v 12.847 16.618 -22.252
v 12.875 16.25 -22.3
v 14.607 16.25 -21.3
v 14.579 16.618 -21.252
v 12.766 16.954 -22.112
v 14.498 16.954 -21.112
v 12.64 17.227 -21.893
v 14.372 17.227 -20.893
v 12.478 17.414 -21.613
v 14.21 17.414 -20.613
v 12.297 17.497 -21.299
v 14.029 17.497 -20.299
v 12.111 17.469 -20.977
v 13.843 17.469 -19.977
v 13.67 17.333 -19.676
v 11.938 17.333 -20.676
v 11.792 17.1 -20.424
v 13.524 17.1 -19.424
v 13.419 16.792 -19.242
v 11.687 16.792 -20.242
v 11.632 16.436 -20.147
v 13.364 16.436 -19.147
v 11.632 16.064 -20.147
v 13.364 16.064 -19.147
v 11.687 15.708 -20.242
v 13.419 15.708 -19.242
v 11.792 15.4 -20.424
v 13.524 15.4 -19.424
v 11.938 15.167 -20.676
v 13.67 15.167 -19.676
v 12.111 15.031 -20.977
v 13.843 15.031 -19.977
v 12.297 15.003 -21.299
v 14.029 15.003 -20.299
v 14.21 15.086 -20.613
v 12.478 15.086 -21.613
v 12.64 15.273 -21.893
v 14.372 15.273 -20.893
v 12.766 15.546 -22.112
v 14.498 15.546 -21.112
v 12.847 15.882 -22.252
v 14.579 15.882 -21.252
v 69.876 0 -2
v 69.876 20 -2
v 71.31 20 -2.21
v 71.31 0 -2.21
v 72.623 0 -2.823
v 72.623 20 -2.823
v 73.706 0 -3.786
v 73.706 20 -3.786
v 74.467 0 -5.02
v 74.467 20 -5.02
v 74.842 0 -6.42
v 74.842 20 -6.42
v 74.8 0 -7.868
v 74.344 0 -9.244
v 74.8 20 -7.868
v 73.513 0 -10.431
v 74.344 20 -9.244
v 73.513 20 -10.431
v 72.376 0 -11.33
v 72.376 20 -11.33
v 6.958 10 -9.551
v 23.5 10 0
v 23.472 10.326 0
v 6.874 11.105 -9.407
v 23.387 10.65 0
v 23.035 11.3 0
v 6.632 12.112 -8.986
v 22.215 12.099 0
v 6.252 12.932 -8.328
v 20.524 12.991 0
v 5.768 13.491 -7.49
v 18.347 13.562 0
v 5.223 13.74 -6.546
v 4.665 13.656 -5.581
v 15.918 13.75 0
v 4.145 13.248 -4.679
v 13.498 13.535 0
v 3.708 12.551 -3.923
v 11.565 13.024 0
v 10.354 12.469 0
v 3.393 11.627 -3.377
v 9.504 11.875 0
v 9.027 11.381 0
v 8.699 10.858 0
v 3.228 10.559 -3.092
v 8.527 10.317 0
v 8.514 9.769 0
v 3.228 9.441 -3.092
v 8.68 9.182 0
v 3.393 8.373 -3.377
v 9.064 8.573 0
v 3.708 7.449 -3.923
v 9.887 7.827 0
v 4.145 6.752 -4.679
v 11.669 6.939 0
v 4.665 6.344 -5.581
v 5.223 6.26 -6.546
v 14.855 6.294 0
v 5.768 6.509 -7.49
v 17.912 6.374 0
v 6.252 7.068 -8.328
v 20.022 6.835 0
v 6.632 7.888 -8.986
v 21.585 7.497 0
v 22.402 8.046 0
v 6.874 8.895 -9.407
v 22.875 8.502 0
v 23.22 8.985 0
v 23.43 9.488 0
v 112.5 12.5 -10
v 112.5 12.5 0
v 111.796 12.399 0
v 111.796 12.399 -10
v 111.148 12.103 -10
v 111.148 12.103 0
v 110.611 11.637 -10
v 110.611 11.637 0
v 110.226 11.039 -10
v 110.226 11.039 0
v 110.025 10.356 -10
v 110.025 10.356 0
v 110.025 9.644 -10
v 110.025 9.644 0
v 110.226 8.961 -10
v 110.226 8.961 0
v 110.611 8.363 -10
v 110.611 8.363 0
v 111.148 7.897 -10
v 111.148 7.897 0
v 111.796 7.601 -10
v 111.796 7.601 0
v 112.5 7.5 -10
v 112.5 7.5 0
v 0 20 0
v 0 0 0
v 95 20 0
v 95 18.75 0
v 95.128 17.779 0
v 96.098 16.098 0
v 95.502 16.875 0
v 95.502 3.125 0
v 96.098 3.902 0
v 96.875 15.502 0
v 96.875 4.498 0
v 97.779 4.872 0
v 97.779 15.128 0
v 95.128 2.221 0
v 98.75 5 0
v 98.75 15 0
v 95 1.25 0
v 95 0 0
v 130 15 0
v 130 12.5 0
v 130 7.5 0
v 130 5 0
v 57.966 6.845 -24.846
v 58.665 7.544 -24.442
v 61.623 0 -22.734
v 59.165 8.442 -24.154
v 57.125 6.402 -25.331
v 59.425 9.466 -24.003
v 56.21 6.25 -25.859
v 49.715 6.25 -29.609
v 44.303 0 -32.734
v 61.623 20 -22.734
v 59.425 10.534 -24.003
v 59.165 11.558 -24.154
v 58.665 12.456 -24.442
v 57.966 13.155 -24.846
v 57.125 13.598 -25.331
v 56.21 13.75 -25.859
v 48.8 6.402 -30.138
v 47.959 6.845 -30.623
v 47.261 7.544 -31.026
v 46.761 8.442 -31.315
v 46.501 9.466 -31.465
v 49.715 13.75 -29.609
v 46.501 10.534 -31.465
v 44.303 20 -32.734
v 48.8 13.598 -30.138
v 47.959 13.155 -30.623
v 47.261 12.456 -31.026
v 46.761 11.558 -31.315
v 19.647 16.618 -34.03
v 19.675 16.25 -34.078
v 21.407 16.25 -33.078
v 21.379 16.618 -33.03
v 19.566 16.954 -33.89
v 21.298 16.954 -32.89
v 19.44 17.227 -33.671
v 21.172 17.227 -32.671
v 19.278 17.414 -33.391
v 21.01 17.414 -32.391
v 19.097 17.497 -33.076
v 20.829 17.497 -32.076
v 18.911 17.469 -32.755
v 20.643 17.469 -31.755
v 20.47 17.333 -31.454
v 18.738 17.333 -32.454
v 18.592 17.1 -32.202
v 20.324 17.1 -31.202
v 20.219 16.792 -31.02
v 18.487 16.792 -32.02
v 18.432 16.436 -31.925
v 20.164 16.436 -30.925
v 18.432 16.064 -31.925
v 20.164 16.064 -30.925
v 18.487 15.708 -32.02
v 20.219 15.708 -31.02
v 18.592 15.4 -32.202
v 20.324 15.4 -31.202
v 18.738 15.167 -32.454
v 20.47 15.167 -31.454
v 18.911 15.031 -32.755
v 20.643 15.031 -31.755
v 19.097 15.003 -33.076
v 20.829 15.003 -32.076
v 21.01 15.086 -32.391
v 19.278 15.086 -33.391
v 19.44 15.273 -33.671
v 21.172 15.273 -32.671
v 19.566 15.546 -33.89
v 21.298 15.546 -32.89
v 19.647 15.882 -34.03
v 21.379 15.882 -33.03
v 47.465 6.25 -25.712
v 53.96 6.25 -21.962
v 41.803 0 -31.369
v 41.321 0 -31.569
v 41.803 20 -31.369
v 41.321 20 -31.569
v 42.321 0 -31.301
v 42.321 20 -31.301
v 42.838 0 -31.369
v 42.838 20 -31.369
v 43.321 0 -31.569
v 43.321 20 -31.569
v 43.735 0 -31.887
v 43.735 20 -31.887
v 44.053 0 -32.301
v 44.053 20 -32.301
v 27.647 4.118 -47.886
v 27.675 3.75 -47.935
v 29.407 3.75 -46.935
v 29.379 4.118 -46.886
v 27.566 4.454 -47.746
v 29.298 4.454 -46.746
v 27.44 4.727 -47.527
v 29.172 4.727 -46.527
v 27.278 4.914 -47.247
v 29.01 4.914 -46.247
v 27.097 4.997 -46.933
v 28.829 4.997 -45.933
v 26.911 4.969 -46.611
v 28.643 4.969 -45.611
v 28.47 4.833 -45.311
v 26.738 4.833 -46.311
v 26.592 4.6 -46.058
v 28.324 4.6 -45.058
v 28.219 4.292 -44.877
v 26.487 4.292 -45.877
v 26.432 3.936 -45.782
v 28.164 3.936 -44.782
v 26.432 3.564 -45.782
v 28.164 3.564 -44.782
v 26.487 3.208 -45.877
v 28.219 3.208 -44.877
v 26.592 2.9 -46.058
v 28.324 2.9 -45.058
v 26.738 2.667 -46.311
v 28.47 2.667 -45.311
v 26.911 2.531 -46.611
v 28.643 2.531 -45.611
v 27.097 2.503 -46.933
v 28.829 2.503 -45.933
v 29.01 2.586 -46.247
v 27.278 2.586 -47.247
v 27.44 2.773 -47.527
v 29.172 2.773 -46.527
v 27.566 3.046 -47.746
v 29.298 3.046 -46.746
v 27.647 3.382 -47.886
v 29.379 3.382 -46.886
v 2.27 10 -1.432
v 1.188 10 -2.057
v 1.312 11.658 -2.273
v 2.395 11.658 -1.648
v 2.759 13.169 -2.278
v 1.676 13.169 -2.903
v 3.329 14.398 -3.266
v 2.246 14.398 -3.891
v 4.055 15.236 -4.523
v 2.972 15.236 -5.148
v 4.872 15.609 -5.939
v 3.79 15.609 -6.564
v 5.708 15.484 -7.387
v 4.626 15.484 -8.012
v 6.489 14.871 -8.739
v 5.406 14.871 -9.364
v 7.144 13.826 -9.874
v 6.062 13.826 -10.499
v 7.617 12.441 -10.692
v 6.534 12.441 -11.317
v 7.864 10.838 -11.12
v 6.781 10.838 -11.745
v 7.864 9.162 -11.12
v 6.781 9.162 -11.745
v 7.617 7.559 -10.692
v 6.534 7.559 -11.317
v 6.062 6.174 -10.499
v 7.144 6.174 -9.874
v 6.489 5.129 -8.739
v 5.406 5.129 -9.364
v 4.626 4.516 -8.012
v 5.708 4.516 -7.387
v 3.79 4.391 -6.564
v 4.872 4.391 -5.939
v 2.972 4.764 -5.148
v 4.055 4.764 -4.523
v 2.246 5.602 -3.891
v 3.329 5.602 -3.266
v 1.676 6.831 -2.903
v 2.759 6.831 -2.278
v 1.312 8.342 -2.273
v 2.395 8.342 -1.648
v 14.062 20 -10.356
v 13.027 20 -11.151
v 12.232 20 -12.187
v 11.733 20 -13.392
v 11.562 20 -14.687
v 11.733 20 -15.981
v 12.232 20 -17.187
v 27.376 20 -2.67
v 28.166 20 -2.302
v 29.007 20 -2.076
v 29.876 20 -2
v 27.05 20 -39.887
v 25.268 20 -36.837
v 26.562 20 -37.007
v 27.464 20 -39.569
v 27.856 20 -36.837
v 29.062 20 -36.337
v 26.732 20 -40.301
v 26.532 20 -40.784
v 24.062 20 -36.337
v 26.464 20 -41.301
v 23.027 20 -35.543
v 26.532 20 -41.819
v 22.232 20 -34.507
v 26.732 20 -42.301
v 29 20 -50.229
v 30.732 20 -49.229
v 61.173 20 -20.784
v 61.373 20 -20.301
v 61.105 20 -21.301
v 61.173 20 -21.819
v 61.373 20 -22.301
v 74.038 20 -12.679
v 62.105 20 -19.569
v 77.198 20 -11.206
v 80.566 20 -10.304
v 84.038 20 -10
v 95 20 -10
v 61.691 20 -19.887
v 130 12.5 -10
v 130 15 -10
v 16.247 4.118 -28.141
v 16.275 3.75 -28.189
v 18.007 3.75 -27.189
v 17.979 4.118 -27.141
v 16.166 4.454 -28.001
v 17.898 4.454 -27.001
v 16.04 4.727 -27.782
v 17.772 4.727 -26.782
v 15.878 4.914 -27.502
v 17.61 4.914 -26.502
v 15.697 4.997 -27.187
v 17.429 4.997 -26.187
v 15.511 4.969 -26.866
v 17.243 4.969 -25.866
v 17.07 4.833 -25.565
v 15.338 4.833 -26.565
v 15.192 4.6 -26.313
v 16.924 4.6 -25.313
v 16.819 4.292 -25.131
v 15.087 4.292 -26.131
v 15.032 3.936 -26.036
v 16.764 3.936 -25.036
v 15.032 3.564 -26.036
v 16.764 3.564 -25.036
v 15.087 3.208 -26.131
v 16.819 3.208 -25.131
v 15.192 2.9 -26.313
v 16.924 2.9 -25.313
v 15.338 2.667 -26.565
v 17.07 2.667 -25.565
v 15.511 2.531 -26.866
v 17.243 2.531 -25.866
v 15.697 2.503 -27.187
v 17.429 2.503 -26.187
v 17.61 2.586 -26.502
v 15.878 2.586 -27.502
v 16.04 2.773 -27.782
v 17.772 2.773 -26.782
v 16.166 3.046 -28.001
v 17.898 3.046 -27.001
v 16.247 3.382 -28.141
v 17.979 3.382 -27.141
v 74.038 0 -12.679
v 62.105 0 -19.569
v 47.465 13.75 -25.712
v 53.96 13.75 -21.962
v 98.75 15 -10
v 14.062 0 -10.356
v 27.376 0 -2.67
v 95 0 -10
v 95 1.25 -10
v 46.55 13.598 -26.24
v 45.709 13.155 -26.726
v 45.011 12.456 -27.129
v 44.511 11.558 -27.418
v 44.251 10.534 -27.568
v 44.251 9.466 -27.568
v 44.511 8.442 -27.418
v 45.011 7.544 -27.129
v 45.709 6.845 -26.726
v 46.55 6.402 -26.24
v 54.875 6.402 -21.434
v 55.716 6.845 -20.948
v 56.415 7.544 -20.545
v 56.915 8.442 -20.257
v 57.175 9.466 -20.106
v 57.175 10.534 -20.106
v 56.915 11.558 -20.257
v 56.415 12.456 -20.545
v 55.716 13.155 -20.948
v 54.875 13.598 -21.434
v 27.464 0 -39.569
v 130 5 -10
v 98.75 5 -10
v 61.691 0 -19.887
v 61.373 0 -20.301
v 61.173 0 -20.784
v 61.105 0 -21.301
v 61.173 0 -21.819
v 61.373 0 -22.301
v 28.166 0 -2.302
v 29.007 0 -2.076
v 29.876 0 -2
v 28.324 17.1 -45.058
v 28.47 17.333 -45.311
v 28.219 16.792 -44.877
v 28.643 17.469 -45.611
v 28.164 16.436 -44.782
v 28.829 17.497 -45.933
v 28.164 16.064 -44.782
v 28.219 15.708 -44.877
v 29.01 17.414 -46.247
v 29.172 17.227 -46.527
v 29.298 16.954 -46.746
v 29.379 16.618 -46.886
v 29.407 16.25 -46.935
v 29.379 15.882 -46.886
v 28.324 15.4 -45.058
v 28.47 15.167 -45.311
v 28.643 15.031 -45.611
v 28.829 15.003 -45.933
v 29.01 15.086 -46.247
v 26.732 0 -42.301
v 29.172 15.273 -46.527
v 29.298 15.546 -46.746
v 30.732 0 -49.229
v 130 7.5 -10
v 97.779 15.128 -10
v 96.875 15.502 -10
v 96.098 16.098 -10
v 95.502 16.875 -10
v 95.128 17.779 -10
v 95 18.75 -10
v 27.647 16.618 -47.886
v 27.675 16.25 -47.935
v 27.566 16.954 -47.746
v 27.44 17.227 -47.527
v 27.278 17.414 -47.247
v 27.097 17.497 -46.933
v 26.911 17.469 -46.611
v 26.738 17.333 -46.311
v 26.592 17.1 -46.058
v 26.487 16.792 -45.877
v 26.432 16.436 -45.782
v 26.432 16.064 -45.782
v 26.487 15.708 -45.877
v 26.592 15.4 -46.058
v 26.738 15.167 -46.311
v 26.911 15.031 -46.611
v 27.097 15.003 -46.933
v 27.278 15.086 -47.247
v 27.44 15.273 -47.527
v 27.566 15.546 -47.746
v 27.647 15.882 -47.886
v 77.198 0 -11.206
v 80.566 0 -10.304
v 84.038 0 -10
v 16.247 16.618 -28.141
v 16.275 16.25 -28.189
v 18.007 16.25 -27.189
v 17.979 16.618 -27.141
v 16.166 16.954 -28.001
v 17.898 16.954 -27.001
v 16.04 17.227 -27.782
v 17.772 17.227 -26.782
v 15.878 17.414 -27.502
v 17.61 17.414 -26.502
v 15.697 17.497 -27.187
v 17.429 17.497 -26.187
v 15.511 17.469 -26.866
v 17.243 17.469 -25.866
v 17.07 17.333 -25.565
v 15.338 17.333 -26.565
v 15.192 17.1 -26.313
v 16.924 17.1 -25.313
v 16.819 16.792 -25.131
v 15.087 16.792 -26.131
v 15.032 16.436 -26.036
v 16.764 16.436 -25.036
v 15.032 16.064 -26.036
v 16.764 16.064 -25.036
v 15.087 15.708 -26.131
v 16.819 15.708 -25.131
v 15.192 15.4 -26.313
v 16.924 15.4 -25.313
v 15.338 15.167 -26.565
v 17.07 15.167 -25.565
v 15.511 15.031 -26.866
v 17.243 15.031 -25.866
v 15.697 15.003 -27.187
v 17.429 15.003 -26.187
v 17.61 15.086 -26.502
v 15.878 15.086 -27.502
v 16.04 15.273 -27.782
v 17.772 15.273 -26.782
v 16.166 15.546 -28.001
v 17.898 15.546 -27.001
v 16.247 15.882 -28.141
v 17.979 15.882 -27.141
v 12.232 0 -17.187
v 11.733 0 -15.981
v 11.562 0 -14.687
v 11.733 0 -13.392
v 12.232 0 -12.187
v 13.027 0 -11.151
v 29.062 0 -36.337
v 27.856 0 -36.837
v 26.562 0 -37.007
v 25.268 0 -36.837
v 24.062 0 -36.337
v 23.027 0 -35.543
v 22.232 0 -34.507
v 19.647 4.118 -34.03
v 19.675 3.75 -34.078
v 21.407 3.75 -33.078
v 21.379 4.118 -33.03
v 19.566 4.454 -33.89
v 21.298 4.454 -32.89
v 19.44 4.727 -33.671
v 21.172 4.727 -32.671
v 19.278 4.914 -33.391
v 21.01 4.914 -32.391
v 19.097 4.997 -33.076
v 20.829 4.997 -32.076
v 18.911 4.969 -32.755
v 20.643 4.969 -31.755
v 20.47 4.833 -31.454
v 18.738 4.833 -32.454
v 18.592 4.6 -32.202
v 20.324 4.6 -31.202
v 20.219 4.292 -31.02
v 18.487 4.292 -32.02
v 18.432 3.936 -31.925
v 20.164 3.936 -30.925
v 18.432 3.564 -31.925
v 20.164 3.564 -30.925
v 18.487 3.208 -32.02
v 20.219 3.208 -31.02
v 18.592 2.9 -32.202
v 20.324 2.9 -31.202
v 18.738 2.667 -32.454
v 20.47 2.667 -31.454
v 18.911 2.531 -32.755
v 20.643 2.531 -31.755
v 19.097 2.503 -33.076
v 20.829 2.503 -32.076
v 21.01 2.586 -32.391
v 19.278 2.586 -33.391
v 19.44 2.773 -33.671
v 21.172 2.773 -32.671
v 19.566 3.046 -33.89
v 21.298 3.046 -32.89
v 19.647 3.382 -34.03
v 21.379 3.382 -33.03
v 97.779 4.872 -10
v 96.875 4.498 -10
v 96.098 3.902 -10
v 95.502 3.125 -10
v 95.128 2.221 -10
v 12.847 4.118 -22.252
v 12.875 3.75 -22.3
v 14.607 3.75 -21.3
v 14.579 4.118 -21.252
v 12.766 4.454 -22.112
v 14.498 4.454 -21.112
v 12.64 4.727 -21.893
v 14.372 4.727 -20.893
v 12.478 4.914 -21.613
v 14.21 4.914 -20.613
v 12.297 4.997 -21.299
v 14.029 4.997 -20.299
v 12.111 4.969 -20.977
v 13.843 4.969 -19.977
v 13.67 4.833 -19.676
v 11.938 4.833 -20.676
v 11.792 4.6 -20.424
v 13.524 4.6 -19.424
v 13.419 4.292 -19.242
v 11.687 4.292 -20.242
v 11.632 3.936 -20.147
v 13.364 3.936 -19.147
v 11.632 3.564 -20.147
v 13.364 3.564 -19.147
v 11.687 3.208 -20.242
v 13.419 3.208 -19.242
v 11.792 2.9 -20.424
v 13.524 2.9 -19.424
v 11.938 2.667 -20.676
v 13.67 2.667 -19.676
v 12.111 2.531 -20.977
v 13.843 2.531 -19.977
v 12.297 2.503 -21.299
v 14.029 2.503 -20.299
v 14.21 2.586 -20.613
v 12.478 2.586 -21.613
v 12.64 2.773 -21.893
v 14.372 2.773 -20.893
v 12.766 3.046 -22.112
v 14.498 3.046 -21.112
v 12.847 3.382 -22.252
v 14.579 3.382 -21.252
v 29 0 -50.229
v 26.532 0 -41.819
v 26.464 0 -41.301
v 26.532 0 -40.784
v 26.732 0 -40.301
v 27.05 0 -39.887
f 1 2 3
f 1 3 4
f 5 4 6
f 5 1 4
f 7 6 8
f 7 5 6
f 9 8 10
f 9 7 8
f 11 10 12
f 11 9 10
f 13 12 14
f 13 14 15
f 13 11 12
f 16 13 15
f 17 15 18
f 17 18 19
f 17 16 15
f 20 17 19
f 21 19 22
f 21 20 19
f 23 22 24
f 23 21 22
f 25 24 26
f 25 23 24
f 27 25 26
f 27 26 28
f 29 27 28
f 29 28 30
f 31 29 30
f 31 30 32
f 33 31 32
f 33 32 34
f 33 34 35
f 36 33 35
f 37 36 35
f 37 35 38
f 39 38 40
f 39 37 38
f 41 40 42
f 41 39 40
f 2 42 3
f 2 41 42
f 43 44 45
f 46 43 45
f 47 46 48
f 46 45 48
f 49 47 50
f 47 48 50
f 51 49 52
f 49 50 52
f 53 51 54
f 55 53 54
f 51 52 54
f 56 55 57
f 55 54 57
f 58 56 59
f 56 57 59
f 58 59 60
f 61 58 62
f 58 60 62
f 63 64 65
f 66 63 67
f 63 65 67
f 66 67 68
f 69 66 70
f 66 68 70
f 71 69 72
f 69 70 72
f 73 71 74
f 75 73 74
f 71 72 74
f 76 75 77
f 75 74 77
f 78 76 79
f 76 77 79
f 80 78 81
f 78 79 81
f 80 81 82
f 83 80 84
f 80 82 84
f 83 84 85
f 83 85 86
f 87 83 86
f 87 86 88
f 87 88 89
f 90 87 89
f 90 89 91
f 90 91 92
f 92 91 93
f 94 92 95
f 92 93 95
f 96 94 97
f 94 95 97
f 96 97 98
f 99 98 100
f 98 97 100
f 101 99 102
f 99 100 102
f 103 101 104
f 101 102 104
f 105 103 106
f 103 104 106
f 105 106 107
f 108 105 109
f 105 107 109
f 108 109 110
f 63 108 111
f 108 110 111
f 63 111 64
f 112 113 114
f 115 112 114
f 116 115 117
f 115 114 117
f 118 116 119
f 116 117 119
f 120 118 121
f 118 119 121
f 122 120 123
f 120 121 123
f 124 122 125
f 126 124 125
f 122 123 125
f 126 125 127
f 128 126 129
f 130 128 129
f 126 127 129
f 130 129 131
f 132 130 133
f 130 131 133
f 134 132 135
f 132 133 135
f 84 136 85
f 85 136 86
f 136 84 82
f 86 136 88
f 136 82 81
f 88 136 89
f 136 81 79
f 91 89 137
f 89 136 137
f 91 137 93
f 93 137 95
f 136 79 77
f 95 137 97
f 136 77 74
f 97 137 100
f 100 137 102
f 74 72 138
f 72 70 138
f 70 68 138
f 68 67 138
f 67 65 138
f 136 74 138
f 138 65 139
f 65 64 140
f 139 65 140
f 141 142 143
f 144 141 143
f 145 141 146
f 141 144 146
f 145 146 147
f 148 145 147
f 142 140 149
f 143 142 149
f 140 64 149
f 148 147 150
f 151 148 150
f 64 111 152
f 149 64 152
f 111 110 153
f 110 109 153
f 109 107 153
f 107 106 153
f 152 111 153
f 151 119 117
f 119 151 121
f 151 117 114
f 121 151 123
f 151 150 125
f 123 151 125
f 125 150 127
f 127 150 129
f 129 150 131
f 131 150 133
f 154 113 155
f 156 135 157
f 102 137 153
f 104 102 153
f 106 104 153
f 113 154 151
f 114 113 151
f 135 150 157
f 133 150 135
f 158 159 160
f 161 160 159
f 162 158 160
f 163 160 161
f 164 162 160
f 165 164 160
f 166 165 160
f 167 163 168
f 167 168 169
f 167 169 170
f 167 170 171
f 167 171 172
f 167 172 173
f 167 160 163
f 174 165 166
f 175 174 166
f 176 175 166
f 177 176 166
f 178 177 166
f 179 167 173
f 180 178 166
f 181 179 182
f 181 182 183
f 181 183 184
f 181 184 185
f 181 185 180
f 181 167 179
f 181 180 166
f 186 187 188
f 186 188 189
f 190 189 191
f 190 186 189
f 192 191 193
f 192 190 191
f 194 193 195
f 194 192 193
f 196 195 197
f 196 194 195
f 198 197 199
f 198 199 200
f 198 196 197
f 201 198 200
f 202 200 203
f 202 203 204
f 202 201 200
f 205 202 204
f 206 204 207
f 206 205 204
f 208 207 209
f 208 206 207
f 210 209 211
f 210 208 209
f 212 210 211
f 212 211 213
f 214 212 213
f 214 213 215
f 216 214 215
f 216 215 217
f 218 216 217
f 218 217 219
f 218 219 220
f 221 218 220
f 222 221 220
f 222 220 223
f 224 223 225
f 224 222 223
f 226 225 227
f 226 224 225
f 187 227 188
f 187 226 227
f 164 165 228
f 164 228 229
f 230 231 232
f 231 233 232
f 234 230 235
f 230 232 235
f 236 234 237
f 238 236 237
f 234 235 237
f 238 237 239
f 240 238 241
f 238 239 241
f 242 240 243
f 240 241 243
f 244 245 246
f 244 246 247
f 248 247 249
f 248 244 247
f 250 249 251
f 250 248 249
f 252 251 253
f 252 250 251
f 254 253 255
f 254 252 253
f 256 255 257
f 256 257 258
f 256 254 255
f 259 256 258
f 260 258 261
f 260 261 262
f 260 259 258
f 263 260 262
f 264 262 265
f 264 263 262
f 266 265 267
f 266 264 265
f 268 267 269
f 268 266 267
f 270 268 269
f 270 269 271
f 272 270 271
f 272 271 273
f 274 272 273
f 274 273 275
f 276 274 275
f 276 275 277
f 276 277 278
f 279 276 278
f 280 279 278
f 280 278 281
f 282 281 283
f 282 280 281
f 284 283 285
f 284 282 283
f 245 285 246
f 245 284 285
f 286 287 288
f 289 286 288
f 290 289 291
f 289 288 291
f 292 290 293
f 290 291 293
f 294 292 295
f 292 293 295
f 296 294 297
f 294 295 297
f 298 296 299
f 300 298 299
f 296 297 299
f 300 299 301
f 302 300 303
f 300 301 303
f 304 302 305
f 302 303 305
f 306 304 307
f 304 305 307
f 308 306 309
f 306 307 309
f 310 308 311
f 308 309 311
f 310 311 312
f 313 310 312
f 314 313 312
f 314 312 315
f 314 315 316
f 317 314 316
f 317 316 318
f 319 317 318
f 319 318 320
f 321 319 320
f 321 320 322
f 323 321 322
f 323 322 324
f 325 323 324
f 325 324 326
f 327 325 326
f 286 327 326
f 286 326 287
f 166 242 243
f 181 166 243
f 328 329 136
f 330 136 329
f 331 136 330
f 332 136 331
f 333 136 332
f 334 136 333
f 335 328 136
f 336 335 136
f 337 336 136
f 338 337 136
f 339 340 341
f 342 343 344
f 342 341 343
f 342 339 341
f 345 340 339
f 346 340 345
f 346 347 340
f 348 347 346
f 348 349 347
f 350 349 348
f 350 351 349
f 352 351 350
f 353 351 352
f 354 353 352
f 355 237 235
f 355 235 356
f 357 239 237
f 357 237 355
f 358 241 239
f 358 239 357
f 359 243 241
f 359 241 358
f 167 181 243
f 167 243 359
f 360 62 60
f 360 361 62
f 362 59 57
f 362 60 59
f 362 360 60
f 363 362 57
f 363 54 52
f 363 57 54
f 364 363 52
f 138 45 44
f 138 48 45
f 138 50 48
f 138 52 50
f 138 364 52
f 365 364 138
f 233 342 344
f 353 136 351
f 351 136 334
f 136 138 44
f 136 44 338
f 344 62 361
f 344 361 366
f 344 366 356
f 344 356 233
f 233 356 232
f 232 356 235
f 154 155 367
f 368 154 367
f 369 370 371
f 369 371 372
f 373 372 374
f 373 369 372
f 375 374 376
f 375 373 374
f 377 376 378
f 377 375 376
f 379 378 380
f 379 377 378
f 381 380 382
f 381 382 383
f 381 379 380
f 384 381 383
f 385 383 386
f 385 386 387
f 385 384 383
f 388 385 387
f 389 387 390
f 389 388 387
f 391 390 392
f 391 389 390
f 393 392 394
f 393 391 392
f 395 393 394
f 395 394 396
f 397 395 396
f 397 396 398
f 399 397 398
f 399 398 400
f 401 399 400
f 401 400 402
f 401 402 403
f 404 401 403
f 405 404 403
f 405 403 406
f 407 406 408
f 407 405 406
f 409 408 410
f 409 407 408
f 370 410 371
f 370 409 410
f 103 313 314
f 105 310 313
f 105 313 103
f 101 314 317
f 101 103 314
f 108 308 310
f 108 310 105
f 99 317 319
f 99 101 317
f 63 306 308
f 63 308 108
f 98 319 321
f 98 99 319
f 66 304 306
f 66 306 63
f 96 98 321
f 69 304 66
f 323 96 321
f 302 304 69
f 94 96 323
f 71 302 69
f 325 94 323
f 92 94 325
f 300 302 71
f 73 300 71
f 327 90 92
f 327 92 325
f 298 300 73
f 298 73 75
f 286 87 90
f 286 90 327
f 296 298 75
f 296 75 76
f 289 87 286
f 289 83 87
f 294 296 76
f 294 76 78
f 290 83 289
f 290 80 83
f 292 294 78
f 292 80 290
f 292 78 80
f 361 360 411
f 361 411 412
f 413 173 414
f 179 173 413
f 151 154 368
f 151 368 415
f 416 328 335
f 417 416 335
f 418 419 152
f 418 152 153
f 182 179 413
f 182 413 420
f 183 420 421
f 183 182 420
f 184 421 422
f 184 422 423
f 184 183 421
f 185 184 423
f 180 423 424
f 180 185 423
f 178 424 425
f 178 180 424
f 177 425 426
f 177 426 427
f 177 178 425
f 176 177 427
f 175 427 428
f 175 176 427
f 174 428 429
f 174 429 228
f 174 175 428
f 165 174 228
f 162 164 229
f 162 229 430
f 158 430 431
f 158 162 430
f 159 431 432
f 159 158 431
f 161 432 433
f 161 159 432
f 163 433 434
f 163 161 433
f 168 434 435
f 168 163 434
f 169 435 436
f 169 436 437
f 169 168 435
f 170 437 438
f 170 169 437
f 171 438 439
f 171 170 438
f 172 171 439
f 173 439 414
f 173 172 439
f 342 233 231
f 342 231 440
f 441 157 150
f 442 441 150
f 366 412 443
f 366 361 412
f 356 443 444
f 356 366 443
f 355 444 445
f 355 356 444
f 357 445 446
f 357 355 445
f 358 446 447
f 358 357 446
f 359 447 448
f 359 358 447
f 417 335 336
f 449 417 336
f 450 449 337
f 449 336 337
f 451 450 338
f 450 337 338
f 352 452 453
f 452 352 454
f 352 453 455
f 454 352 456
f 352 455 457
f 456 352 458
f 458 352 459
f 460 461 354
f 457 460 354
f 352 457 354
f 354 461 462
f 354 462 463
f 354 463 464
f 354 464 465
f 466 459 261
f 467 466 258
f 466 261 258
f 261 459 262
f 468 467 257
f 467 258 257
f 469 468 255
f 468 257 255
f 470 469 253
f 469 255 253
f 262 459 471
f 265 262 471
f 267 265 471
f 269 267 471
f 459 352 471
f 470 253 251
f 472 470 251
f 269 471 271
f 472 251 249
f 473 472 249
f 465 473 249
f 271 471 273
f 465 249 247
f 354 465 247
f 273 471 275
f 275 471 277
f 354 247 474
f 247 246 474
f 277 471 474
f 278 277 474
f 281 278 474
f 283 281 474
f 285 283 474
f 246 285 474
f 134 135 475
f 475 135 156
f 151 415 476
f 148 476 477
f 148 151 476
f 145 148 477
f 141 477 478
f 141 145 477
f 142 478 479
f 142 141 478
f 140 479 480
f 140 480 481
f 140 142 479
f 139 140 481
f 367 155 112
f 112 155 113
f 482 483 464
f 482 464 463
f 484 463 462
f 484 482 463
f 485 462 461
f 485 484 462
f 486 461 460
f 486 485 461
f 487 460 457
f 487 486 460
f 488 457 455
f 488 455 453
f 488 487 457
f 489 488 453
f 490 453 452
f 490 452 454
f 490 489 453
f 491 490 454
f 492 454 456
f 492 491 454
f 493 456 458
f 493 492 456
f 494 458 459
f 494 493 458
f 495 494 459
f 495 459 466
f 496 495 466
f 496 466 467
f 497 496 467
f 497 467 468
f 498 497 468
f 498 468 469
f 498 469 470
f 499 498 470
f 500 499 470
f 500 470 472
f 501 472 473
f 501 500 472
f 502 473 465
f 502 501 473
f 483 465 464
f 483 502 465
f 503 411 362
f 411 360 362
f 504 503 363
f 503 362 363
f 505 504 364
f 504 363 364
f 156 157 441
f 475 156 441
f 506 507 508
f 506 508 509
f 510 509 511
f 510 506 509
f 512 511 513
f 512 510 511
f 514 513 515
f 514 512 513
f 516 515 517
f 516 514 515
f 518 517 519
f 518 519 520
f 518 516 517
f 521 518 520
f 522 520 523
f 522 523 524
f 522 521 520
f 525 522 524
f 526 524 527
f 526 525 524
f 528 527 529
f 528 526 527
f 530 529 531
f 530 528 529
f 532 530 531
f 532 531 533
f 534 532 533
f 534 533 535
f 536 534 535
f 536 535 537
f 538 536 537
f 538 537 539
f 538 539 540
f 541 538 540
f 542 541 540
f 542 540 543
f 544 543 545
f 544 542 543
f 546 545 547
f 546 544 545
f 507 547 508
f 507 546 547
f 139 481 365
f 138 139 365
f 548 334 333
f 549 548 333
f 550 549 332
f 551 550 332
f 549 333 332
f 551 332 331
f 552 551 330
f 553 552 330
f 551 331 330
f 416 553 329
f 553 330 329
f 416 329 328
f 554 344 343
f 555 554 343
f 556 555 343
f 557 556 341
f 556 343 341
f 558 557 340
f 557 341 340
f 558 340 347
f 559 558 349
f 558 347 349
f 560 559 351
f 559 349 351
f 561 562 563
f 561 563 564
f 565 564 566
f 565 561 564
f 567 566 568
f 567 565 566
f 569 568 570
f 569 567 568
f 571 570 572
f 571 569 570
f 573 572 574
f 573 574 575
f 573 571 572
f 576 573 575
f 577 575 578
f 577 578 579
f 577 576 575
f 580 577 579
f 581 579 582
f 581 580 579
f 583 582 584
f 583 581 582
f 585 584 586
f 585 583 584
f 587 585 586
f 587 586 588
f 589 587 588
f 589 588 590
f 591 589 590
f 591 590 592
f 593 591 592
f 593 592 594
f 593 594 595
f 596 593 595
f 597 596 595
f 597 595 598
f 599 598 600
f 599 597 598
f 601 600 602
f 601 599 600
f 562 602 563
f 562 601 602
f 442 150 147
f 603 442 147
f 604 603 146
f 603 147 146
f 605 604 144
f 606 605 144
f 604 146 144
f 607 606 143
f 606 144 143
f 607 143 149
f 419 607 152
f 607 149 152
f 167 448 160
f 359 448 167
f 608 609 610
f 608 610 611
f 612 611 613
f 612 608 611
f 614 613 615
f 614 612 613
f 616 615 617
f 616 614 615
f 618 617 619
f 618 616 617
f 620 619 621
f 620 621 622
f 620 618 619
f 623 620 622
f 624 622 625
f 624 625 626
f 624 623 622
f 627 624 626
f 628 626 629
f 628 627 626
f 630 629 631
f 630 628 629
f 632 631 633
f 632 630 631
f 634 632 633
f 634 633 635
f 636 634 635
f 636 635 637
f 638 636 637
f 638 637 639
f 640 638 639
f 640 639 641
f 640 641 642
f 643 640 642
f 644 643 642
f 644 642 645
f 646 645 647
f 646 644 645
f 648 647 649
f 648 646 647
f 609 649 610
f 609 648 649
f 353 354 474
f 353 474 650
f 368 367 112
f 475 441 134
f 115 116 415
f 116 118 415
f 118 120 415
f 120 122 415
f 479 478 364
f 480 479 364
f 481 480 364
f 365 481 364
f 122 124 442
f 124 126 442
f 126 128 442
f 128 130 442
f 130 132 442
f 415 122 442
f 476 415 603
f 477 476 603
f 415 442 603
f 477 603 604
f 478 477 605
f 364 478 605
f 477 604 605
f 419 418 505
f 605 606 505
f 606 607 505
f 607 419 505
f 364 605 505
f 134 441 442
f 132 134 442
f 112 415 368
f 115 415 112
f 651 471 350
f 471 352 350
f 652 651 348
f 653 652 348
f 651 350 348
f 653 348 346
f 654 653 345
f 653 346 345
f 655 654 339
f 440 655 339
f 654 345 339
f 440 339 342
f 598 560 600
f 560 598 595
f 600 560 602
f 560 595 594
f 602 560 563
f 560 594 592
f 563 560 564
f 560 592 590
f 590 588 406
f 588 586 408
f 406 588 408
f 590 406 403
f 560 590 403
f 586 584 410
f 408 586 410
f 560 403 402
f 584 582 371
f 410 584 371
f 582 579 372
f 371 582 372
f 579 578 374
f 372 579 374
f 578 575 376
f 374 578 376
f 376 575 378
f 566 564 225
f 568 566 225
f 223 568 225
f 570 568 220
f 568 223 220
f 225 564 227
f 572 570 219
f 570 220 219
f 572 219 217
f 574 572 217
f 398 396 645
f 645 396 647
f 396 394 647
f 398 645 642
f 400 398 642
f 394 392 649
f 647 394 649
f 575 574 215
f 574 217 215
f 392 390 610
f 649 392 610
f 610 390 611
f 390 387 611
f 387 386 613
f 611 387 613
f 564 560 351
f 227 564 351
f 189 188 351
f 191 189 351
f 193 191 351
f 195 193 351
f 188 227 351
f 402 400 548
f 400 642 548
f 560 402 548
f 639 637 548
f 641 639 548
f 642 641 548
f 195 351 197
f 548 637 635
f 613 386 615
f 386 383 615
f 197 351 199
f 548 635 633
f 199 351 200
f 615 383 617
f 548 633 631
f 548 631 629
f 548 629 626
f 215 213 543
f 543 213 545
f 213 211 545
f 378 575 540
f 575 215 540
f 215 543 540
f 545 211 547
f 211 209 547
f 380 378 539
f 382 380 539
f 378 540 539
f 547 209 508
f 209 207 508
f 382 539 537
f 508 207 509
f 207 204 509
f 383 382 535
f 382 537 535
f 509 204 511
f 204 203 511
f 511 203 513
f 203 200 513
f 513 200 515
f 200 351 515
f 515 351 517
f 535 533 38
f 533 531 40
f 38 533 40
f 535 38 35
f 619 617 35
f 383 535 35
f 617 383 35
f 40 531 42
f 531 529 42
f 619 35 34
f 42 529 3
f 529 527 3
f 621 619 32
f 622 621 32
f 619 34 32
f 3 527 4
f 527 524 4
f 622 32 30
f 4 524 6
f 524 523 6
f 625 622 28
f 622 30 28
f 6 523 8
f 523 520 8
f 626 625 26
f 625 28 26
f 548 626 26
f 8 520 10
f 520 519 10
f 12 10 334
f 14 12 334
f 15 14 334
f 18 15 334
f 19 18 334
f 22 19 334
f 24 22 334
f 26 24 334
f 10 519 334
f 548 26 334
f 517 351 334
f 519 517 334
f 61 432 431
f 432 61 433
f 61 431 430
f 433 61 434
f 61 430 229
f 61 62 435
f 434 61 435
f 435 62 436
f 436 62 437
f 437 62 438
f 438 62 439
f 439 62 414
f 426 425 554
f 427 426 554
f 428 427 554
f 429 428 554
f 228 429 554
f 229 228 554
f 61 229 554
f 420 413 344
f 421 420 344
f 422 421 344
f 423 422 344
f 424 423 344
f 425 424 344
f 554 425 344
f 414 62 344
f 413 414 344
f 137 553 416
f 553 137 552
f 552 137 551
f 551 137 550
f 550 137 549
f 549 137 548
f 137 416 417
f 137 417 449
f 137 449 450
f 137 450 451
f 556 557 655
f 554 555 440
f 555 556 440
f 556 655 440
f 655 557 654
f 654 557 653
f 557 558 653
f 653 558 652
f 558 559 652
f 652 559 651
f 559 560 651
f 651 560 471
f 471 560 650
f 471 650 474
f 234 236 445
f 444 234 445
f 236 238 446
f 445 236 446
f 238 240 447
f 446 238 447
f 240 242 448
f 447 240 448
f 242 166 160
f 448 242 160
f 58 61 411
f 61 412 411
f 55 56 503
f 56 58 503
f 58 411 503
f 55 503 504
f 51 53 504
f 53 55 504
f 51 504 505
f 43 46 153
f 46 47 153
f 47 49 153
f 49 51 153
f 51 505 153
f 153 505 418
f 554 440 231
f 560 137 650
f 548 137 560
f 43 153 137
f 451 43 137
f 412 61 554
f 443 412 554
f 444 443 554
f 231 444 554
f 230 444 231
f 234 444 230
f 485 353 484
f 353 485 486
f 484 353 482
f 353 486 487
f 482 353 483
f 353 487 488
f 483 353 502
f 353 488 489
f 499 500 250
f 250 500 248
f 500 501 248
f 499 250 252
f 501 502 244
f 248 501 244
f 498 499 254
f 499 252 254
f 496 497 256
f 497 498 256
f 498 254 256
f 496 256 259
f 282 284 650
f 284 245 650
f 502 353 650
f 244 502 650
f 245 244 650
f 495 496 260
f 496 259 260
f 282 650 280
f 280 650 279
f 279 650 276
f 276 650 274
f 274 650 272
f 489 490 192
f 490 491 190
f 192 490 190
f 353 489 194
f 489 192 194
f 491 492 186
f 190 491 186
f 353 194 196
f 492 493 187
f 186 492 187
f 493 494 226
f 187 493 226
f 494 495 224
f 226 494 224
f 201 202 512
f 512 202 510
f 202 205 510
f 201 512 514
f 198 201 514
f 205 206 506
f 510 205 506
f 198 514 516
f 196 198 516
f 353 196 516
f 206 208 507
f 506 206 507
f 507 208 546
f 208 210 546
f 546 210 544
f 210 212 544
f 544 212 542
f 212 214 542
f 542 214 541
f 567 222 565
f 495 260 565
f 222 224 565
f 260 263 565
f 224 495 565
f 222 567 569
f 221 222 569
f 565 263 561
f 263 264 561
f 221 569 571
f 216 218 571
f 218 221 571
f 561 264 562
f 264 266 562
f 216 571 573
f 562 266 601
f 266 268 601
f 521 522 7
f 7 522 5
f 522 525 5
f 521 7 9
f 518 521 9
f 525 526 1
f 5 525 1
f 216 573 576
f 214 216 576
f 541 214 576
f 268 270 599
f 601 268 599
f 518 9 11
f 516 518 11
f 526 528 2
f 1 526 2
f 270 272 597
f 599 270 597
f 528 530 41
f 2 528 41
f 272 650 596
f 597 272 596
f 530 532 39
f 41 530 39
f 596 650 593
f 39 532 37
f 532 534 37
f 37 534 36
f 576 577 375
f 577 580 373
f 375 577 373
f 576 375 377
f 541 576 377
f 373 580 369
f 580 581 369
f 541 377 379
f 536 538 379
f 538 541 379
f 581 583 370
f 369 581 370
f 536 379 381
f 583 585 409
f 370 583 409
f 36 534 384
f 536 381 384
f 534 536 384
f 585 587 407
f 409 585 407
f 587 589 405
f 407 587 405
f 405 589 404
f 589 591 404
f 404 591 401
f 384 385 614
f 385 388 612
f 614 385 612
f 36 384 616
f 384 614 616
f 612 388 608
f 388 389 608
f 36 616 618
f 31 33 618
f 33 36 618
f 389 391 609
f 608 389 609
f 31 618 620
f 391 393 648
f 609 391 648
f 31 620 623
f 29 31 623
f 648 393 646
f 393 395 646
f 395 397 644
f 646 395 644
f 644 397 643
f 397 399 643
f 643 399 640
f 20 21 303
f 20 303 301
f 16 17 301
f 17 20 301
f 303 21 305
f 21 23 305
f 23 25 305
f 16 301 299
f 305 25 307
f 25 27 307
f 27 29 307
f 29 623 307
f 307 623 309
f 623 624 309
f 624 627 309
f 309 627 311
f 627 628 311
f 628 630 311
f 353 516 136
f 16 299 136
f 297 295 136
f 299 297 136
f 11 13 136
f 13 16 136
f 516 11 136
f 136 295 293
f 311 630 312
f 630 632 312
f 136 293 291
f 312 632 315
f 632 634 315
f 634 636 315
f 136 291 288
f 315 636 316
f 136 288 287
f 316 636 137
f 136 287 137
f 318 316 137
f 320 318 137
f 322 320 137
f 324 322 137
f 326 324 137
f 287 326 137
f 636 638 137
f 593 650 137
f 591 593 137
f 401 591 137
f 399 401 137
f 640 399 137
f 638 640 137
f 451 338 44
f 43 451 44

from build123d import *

# Parameters (mm, degrees)
BOSS_EXTRUDE1_DEPTH                     = 20
CUT_EXTRUDE1_DEPTH                      = 20
CBORE_FOR_M5_HEX_HEAD_BOLT1_D           = 7.5
CBORE_FOR_M5_HEX_HEAD_BOLT1_DEPTH       = 112.583668517
CBORE_FOR_M5_HEX_HEAD_BOLT1_CBORE_D     = 11.25
CBORE_FOR_M5_HEX_HEAD_BOLT1_CBORE_DEPTH = 1.25
CBORE_FOR_M5_HEX_HEAD_BOLT1_TIP         = 2.253227321
CUT_EXTRUDE2_DEPTH                      = 10
SKETCH6_W                               = 20
SKETCH6_H                               = 20
BOSS_EXTRUDE2_DEPTH                     = 2.5
FILLET1_R                               = 2
FILLET2_R                               = 20
CUT_EXTRUDE3_DEPTH                      = 4.5
HOLE1_OUTLINE_R                         = 1.25
HOLE1_DEPTH                             = 2
LPATTERN1_COUNT                         = 3
LPATTERN1_PITCH                         = 6.8
LPATTERN1_COUNT_DIR2                    = 2
LPATTERN1_PITCH_DIR2                    = 12.5
LPATTERN2_COUNT                         = 2
LPATTERN2_PITCH                         = 29.6
LPATTERN2_COUNT_DIR2                    = 2
LPATTERN2_PITCH_DIR2                    = 12.5


# Read off the part's stored shape, not the designer's step: Hole1
with BuildPart() as part:
    # Sketch1 → Boss-Extrude1 (new body)
    with BuildSketch(Plane(origin=(0, 0, 0), x_dir=(1, 0, 0), z_dir=(0, 1, 0))):
        Polygon((29, 50.229473419), (0, 0), (130, 0), (130, 10), (78.679491924, 10), (25.732050808, 40.569219382), (30.732050808, 49.229473419), align=None)
    extrude(amount=BOSS_EXTRUDE1_DEPTH)

    # Sketch2 → Cut-Extrude1 (cut)
    with BuildSketch(Plane(origin=(0, 20, 0), x_dir=(1, 0, 0), z_dir=(0, 1, 0))):
        with BuildLine():
            Line((29.875644347, 2), (69.875644347, 2))
            ThreePointArc((69.875644347, 2), (74.705273478, 5.705904774), (72.375644347, 11.330127019))
            Line((72.375644347, 11.330127019), (29.062177826, 36.337168574))
            ThreePointArc((29.062177826, 36.337168574), (25.268082601, 36.836670687), (22.232050808, 34.507041555))
            Line((22.232050808, 34.507041555), (12.232050808, 17.186533479))
            ThreePointArc((12.232050808, 17.186533479), (11.732548695, 13.392438254), (14.062177826, 10.356406461))
            Line((14.062177826, 10.356406461), (27.375644347, 2.669872981))
            ThreePointArc((27.375644347, 2.669872981), (28.581549122, 2.170370869), (29.875644347, 2))
        make_face()
    extrude(amount=-CUT_EXTRUDE1_DEPTH, mode=Mode.SUBTRACT)

    # CBORE for M5 Hex Head Bolt1
    with Locations(Plane(origin=(0, 0, 0), x_dir=(-0.5000000000000042, 0, 0.8660254037844363), z_dir=(-0.8660254037844362, 0, -0.5000000000000041))):
        with Locations((-8, 10)):
            CounterBoreHole(CBORE_FOR_M5_HEX_HEAD_BOLT1_D / 2, CBORE_FOR_M5_HEX_HEAD_BOLT1_CBORE_D / 2, CBORE_FOR_M5_HEX_HEAD_BOLT1_CBORE_DEPTH, depth=CBORE_FOR_M5_HEX_HEAD_BOLT1_DEPTH)
            with Locations((0, 0, -(CBORE_FOR_M5_HEX_HEAD_BOLT1_DEPTH + CBORE_FOR_M5_HEX_HEAD_BOLT1_TIP / 2))):  # 118° drill point
                Cone(0, CBORE_FOR_M5_HEX_HEAD_BOLT1_D / 2, CBORE_FOR_M5_HEX_HEAD_BOLT1_TIP, mode=Mode.SUBTRACT)

    # Sketch5 → Cut-Extrude2 (cut)
    with BuildSketch(Plane.XY):
        with BuildLine():
            Line((95, 20), (130, 20))
            Line((130, 20), (130, 15))
            Line((130, 15), (98.75, 15))
            ThreePointArc((98.75, 15), (96.098349571, 16.098349571), (95, 18.75))
            Line((95, 18.75), (95, 20))
        make_face()
        with BuildLine():
            Line((95, 0), (130, 0))
            Line((130, 0), (130, 5))
            Line((130, 5), (98.75, 5))
            ThreePointArc((98.75, 5), (96.098349571, 3.901650429), (95, 1.25))
            Line((95, 1.25), (95, 0))
        make_face()
        with BuildLine():
            Line((130, 12.5), (112.5, 12.5))
            ThreePointArc((112.5, 12.5), (110, 10), (112.5, 7.5))
            Line((112.5, 7.5), (130, 7.5))
            Line((130, 7.5), (130, 12.5))
        make_face()
    extrude(amount=-CUT_EXTRUDE2_DEPTH, mode=Mode.SUBTRACT)

    # Sketch6 → Boss-Extrude2 (add)
    with BuildSketch(Plane(origin=(24, 0, -41.569219382), x_dir=(-0.8660254037844363, 0, -0.5000000000000042), z_dir=(0.5000000000000042, 0, -0.8660254037844363))):
        with Locations((-32, 10)):
            Rectangle(SKETCH6_W, SKETCH6_H)
    extrude(amount=BOSS_EXTRUDE2_DEPTH)

    # Fillet1
    fillet1_edges = [part.edges().sort_by_distance(p)[0] for p in [
        (60.373066959, 10, -20.569219382),
        (43.052558883, 10, -30.569219382),
        (25.732050808, 10, -40.569219382),
    ]]
    fillet(fillet1_edges, radius=FILLET1_R)

    # Fillet2
    fillet2_edges = [part.edges().sort_by_distance(p)[0] for p in [
        (78.679491924, 10, -10),
    ]]
    fillet(fillet2_edges, radius=FILLET2_R)

    # Sketch7 → Cut-Extrude3 (cut)
    with BuildSketch(Plane(origin=(25.25, 0, -43.734282891), x_dir=(-0.8660254037844363, 0, -0.5000000000000042), z_dir=(0.5000000000000042, 0, -0.8660254037844363))):
        with BuildLine():
            Line((-35.75, 13.75), (-28.25, 13.75))
            ThreePointArc((-28.25, 13.75), (-24.5, 10), (-28.25, 6.25))
            Line((-28.25, 6.25), (-35.75, 6.25))
            ThreePointArc((-35.75, 6.25), (-39.5, 10), (-35.75, 13.75))
        make_face()
    extrude(amount=-CUT_EXTRUDE3_DEPTH, mode=Mode.SUBTRACT)

    # Hole1 outline → Hole1 (cut)
    with BuildSketch(Plane(origin=(0, 0, 0), x_dir=(0.500000000000004, 0, -0.8660254037844363), z_dir=(0.8660254037844363, 0, 0.5000000000000042))):
        with Locations((24.5, 16.25)):
            Circle(HOLE1_OUTLINE_R)
    hole1 = extrude(amount=HOLE1_DEPTH, mode=Mode.SUBTRACT)

    # LPattern1: Hole1 3 × 2
    with Locations(*[Vector(0.5000000000000041, 0, -0.8660254037844363) * (i * LPATTERN1_PITCH) + Vector(0, -1, 0) * (j * LPATTERN1_PITCH_DIR2) for i in range(LPATTERN1_COUNT) for j in range(LPATTERN1_COUNT_DIR2) if (i, j) != (0, 0)]):
        add(hole1, mode=Mode.SUBTRACT)

    # LPattern2: Hole1 2 × 2, 1 skipped
    with Locations(*[Vector(0.5000000000000041, 0, -0.8660254037844363) * (i * LPATTERN2_PITCH) + Vector(0, -1, 0) * (j * LPATTERN2_PITCH_DIR2) for i in range(LPATTERN2_COUNT) for j in range(LPATTERN2_COUNT_DIR2) if (i, j) not in ((0, 0), (0, 1))]):
        add(hole1, mode=Mode.SUBTRACT)


solid = part.part
